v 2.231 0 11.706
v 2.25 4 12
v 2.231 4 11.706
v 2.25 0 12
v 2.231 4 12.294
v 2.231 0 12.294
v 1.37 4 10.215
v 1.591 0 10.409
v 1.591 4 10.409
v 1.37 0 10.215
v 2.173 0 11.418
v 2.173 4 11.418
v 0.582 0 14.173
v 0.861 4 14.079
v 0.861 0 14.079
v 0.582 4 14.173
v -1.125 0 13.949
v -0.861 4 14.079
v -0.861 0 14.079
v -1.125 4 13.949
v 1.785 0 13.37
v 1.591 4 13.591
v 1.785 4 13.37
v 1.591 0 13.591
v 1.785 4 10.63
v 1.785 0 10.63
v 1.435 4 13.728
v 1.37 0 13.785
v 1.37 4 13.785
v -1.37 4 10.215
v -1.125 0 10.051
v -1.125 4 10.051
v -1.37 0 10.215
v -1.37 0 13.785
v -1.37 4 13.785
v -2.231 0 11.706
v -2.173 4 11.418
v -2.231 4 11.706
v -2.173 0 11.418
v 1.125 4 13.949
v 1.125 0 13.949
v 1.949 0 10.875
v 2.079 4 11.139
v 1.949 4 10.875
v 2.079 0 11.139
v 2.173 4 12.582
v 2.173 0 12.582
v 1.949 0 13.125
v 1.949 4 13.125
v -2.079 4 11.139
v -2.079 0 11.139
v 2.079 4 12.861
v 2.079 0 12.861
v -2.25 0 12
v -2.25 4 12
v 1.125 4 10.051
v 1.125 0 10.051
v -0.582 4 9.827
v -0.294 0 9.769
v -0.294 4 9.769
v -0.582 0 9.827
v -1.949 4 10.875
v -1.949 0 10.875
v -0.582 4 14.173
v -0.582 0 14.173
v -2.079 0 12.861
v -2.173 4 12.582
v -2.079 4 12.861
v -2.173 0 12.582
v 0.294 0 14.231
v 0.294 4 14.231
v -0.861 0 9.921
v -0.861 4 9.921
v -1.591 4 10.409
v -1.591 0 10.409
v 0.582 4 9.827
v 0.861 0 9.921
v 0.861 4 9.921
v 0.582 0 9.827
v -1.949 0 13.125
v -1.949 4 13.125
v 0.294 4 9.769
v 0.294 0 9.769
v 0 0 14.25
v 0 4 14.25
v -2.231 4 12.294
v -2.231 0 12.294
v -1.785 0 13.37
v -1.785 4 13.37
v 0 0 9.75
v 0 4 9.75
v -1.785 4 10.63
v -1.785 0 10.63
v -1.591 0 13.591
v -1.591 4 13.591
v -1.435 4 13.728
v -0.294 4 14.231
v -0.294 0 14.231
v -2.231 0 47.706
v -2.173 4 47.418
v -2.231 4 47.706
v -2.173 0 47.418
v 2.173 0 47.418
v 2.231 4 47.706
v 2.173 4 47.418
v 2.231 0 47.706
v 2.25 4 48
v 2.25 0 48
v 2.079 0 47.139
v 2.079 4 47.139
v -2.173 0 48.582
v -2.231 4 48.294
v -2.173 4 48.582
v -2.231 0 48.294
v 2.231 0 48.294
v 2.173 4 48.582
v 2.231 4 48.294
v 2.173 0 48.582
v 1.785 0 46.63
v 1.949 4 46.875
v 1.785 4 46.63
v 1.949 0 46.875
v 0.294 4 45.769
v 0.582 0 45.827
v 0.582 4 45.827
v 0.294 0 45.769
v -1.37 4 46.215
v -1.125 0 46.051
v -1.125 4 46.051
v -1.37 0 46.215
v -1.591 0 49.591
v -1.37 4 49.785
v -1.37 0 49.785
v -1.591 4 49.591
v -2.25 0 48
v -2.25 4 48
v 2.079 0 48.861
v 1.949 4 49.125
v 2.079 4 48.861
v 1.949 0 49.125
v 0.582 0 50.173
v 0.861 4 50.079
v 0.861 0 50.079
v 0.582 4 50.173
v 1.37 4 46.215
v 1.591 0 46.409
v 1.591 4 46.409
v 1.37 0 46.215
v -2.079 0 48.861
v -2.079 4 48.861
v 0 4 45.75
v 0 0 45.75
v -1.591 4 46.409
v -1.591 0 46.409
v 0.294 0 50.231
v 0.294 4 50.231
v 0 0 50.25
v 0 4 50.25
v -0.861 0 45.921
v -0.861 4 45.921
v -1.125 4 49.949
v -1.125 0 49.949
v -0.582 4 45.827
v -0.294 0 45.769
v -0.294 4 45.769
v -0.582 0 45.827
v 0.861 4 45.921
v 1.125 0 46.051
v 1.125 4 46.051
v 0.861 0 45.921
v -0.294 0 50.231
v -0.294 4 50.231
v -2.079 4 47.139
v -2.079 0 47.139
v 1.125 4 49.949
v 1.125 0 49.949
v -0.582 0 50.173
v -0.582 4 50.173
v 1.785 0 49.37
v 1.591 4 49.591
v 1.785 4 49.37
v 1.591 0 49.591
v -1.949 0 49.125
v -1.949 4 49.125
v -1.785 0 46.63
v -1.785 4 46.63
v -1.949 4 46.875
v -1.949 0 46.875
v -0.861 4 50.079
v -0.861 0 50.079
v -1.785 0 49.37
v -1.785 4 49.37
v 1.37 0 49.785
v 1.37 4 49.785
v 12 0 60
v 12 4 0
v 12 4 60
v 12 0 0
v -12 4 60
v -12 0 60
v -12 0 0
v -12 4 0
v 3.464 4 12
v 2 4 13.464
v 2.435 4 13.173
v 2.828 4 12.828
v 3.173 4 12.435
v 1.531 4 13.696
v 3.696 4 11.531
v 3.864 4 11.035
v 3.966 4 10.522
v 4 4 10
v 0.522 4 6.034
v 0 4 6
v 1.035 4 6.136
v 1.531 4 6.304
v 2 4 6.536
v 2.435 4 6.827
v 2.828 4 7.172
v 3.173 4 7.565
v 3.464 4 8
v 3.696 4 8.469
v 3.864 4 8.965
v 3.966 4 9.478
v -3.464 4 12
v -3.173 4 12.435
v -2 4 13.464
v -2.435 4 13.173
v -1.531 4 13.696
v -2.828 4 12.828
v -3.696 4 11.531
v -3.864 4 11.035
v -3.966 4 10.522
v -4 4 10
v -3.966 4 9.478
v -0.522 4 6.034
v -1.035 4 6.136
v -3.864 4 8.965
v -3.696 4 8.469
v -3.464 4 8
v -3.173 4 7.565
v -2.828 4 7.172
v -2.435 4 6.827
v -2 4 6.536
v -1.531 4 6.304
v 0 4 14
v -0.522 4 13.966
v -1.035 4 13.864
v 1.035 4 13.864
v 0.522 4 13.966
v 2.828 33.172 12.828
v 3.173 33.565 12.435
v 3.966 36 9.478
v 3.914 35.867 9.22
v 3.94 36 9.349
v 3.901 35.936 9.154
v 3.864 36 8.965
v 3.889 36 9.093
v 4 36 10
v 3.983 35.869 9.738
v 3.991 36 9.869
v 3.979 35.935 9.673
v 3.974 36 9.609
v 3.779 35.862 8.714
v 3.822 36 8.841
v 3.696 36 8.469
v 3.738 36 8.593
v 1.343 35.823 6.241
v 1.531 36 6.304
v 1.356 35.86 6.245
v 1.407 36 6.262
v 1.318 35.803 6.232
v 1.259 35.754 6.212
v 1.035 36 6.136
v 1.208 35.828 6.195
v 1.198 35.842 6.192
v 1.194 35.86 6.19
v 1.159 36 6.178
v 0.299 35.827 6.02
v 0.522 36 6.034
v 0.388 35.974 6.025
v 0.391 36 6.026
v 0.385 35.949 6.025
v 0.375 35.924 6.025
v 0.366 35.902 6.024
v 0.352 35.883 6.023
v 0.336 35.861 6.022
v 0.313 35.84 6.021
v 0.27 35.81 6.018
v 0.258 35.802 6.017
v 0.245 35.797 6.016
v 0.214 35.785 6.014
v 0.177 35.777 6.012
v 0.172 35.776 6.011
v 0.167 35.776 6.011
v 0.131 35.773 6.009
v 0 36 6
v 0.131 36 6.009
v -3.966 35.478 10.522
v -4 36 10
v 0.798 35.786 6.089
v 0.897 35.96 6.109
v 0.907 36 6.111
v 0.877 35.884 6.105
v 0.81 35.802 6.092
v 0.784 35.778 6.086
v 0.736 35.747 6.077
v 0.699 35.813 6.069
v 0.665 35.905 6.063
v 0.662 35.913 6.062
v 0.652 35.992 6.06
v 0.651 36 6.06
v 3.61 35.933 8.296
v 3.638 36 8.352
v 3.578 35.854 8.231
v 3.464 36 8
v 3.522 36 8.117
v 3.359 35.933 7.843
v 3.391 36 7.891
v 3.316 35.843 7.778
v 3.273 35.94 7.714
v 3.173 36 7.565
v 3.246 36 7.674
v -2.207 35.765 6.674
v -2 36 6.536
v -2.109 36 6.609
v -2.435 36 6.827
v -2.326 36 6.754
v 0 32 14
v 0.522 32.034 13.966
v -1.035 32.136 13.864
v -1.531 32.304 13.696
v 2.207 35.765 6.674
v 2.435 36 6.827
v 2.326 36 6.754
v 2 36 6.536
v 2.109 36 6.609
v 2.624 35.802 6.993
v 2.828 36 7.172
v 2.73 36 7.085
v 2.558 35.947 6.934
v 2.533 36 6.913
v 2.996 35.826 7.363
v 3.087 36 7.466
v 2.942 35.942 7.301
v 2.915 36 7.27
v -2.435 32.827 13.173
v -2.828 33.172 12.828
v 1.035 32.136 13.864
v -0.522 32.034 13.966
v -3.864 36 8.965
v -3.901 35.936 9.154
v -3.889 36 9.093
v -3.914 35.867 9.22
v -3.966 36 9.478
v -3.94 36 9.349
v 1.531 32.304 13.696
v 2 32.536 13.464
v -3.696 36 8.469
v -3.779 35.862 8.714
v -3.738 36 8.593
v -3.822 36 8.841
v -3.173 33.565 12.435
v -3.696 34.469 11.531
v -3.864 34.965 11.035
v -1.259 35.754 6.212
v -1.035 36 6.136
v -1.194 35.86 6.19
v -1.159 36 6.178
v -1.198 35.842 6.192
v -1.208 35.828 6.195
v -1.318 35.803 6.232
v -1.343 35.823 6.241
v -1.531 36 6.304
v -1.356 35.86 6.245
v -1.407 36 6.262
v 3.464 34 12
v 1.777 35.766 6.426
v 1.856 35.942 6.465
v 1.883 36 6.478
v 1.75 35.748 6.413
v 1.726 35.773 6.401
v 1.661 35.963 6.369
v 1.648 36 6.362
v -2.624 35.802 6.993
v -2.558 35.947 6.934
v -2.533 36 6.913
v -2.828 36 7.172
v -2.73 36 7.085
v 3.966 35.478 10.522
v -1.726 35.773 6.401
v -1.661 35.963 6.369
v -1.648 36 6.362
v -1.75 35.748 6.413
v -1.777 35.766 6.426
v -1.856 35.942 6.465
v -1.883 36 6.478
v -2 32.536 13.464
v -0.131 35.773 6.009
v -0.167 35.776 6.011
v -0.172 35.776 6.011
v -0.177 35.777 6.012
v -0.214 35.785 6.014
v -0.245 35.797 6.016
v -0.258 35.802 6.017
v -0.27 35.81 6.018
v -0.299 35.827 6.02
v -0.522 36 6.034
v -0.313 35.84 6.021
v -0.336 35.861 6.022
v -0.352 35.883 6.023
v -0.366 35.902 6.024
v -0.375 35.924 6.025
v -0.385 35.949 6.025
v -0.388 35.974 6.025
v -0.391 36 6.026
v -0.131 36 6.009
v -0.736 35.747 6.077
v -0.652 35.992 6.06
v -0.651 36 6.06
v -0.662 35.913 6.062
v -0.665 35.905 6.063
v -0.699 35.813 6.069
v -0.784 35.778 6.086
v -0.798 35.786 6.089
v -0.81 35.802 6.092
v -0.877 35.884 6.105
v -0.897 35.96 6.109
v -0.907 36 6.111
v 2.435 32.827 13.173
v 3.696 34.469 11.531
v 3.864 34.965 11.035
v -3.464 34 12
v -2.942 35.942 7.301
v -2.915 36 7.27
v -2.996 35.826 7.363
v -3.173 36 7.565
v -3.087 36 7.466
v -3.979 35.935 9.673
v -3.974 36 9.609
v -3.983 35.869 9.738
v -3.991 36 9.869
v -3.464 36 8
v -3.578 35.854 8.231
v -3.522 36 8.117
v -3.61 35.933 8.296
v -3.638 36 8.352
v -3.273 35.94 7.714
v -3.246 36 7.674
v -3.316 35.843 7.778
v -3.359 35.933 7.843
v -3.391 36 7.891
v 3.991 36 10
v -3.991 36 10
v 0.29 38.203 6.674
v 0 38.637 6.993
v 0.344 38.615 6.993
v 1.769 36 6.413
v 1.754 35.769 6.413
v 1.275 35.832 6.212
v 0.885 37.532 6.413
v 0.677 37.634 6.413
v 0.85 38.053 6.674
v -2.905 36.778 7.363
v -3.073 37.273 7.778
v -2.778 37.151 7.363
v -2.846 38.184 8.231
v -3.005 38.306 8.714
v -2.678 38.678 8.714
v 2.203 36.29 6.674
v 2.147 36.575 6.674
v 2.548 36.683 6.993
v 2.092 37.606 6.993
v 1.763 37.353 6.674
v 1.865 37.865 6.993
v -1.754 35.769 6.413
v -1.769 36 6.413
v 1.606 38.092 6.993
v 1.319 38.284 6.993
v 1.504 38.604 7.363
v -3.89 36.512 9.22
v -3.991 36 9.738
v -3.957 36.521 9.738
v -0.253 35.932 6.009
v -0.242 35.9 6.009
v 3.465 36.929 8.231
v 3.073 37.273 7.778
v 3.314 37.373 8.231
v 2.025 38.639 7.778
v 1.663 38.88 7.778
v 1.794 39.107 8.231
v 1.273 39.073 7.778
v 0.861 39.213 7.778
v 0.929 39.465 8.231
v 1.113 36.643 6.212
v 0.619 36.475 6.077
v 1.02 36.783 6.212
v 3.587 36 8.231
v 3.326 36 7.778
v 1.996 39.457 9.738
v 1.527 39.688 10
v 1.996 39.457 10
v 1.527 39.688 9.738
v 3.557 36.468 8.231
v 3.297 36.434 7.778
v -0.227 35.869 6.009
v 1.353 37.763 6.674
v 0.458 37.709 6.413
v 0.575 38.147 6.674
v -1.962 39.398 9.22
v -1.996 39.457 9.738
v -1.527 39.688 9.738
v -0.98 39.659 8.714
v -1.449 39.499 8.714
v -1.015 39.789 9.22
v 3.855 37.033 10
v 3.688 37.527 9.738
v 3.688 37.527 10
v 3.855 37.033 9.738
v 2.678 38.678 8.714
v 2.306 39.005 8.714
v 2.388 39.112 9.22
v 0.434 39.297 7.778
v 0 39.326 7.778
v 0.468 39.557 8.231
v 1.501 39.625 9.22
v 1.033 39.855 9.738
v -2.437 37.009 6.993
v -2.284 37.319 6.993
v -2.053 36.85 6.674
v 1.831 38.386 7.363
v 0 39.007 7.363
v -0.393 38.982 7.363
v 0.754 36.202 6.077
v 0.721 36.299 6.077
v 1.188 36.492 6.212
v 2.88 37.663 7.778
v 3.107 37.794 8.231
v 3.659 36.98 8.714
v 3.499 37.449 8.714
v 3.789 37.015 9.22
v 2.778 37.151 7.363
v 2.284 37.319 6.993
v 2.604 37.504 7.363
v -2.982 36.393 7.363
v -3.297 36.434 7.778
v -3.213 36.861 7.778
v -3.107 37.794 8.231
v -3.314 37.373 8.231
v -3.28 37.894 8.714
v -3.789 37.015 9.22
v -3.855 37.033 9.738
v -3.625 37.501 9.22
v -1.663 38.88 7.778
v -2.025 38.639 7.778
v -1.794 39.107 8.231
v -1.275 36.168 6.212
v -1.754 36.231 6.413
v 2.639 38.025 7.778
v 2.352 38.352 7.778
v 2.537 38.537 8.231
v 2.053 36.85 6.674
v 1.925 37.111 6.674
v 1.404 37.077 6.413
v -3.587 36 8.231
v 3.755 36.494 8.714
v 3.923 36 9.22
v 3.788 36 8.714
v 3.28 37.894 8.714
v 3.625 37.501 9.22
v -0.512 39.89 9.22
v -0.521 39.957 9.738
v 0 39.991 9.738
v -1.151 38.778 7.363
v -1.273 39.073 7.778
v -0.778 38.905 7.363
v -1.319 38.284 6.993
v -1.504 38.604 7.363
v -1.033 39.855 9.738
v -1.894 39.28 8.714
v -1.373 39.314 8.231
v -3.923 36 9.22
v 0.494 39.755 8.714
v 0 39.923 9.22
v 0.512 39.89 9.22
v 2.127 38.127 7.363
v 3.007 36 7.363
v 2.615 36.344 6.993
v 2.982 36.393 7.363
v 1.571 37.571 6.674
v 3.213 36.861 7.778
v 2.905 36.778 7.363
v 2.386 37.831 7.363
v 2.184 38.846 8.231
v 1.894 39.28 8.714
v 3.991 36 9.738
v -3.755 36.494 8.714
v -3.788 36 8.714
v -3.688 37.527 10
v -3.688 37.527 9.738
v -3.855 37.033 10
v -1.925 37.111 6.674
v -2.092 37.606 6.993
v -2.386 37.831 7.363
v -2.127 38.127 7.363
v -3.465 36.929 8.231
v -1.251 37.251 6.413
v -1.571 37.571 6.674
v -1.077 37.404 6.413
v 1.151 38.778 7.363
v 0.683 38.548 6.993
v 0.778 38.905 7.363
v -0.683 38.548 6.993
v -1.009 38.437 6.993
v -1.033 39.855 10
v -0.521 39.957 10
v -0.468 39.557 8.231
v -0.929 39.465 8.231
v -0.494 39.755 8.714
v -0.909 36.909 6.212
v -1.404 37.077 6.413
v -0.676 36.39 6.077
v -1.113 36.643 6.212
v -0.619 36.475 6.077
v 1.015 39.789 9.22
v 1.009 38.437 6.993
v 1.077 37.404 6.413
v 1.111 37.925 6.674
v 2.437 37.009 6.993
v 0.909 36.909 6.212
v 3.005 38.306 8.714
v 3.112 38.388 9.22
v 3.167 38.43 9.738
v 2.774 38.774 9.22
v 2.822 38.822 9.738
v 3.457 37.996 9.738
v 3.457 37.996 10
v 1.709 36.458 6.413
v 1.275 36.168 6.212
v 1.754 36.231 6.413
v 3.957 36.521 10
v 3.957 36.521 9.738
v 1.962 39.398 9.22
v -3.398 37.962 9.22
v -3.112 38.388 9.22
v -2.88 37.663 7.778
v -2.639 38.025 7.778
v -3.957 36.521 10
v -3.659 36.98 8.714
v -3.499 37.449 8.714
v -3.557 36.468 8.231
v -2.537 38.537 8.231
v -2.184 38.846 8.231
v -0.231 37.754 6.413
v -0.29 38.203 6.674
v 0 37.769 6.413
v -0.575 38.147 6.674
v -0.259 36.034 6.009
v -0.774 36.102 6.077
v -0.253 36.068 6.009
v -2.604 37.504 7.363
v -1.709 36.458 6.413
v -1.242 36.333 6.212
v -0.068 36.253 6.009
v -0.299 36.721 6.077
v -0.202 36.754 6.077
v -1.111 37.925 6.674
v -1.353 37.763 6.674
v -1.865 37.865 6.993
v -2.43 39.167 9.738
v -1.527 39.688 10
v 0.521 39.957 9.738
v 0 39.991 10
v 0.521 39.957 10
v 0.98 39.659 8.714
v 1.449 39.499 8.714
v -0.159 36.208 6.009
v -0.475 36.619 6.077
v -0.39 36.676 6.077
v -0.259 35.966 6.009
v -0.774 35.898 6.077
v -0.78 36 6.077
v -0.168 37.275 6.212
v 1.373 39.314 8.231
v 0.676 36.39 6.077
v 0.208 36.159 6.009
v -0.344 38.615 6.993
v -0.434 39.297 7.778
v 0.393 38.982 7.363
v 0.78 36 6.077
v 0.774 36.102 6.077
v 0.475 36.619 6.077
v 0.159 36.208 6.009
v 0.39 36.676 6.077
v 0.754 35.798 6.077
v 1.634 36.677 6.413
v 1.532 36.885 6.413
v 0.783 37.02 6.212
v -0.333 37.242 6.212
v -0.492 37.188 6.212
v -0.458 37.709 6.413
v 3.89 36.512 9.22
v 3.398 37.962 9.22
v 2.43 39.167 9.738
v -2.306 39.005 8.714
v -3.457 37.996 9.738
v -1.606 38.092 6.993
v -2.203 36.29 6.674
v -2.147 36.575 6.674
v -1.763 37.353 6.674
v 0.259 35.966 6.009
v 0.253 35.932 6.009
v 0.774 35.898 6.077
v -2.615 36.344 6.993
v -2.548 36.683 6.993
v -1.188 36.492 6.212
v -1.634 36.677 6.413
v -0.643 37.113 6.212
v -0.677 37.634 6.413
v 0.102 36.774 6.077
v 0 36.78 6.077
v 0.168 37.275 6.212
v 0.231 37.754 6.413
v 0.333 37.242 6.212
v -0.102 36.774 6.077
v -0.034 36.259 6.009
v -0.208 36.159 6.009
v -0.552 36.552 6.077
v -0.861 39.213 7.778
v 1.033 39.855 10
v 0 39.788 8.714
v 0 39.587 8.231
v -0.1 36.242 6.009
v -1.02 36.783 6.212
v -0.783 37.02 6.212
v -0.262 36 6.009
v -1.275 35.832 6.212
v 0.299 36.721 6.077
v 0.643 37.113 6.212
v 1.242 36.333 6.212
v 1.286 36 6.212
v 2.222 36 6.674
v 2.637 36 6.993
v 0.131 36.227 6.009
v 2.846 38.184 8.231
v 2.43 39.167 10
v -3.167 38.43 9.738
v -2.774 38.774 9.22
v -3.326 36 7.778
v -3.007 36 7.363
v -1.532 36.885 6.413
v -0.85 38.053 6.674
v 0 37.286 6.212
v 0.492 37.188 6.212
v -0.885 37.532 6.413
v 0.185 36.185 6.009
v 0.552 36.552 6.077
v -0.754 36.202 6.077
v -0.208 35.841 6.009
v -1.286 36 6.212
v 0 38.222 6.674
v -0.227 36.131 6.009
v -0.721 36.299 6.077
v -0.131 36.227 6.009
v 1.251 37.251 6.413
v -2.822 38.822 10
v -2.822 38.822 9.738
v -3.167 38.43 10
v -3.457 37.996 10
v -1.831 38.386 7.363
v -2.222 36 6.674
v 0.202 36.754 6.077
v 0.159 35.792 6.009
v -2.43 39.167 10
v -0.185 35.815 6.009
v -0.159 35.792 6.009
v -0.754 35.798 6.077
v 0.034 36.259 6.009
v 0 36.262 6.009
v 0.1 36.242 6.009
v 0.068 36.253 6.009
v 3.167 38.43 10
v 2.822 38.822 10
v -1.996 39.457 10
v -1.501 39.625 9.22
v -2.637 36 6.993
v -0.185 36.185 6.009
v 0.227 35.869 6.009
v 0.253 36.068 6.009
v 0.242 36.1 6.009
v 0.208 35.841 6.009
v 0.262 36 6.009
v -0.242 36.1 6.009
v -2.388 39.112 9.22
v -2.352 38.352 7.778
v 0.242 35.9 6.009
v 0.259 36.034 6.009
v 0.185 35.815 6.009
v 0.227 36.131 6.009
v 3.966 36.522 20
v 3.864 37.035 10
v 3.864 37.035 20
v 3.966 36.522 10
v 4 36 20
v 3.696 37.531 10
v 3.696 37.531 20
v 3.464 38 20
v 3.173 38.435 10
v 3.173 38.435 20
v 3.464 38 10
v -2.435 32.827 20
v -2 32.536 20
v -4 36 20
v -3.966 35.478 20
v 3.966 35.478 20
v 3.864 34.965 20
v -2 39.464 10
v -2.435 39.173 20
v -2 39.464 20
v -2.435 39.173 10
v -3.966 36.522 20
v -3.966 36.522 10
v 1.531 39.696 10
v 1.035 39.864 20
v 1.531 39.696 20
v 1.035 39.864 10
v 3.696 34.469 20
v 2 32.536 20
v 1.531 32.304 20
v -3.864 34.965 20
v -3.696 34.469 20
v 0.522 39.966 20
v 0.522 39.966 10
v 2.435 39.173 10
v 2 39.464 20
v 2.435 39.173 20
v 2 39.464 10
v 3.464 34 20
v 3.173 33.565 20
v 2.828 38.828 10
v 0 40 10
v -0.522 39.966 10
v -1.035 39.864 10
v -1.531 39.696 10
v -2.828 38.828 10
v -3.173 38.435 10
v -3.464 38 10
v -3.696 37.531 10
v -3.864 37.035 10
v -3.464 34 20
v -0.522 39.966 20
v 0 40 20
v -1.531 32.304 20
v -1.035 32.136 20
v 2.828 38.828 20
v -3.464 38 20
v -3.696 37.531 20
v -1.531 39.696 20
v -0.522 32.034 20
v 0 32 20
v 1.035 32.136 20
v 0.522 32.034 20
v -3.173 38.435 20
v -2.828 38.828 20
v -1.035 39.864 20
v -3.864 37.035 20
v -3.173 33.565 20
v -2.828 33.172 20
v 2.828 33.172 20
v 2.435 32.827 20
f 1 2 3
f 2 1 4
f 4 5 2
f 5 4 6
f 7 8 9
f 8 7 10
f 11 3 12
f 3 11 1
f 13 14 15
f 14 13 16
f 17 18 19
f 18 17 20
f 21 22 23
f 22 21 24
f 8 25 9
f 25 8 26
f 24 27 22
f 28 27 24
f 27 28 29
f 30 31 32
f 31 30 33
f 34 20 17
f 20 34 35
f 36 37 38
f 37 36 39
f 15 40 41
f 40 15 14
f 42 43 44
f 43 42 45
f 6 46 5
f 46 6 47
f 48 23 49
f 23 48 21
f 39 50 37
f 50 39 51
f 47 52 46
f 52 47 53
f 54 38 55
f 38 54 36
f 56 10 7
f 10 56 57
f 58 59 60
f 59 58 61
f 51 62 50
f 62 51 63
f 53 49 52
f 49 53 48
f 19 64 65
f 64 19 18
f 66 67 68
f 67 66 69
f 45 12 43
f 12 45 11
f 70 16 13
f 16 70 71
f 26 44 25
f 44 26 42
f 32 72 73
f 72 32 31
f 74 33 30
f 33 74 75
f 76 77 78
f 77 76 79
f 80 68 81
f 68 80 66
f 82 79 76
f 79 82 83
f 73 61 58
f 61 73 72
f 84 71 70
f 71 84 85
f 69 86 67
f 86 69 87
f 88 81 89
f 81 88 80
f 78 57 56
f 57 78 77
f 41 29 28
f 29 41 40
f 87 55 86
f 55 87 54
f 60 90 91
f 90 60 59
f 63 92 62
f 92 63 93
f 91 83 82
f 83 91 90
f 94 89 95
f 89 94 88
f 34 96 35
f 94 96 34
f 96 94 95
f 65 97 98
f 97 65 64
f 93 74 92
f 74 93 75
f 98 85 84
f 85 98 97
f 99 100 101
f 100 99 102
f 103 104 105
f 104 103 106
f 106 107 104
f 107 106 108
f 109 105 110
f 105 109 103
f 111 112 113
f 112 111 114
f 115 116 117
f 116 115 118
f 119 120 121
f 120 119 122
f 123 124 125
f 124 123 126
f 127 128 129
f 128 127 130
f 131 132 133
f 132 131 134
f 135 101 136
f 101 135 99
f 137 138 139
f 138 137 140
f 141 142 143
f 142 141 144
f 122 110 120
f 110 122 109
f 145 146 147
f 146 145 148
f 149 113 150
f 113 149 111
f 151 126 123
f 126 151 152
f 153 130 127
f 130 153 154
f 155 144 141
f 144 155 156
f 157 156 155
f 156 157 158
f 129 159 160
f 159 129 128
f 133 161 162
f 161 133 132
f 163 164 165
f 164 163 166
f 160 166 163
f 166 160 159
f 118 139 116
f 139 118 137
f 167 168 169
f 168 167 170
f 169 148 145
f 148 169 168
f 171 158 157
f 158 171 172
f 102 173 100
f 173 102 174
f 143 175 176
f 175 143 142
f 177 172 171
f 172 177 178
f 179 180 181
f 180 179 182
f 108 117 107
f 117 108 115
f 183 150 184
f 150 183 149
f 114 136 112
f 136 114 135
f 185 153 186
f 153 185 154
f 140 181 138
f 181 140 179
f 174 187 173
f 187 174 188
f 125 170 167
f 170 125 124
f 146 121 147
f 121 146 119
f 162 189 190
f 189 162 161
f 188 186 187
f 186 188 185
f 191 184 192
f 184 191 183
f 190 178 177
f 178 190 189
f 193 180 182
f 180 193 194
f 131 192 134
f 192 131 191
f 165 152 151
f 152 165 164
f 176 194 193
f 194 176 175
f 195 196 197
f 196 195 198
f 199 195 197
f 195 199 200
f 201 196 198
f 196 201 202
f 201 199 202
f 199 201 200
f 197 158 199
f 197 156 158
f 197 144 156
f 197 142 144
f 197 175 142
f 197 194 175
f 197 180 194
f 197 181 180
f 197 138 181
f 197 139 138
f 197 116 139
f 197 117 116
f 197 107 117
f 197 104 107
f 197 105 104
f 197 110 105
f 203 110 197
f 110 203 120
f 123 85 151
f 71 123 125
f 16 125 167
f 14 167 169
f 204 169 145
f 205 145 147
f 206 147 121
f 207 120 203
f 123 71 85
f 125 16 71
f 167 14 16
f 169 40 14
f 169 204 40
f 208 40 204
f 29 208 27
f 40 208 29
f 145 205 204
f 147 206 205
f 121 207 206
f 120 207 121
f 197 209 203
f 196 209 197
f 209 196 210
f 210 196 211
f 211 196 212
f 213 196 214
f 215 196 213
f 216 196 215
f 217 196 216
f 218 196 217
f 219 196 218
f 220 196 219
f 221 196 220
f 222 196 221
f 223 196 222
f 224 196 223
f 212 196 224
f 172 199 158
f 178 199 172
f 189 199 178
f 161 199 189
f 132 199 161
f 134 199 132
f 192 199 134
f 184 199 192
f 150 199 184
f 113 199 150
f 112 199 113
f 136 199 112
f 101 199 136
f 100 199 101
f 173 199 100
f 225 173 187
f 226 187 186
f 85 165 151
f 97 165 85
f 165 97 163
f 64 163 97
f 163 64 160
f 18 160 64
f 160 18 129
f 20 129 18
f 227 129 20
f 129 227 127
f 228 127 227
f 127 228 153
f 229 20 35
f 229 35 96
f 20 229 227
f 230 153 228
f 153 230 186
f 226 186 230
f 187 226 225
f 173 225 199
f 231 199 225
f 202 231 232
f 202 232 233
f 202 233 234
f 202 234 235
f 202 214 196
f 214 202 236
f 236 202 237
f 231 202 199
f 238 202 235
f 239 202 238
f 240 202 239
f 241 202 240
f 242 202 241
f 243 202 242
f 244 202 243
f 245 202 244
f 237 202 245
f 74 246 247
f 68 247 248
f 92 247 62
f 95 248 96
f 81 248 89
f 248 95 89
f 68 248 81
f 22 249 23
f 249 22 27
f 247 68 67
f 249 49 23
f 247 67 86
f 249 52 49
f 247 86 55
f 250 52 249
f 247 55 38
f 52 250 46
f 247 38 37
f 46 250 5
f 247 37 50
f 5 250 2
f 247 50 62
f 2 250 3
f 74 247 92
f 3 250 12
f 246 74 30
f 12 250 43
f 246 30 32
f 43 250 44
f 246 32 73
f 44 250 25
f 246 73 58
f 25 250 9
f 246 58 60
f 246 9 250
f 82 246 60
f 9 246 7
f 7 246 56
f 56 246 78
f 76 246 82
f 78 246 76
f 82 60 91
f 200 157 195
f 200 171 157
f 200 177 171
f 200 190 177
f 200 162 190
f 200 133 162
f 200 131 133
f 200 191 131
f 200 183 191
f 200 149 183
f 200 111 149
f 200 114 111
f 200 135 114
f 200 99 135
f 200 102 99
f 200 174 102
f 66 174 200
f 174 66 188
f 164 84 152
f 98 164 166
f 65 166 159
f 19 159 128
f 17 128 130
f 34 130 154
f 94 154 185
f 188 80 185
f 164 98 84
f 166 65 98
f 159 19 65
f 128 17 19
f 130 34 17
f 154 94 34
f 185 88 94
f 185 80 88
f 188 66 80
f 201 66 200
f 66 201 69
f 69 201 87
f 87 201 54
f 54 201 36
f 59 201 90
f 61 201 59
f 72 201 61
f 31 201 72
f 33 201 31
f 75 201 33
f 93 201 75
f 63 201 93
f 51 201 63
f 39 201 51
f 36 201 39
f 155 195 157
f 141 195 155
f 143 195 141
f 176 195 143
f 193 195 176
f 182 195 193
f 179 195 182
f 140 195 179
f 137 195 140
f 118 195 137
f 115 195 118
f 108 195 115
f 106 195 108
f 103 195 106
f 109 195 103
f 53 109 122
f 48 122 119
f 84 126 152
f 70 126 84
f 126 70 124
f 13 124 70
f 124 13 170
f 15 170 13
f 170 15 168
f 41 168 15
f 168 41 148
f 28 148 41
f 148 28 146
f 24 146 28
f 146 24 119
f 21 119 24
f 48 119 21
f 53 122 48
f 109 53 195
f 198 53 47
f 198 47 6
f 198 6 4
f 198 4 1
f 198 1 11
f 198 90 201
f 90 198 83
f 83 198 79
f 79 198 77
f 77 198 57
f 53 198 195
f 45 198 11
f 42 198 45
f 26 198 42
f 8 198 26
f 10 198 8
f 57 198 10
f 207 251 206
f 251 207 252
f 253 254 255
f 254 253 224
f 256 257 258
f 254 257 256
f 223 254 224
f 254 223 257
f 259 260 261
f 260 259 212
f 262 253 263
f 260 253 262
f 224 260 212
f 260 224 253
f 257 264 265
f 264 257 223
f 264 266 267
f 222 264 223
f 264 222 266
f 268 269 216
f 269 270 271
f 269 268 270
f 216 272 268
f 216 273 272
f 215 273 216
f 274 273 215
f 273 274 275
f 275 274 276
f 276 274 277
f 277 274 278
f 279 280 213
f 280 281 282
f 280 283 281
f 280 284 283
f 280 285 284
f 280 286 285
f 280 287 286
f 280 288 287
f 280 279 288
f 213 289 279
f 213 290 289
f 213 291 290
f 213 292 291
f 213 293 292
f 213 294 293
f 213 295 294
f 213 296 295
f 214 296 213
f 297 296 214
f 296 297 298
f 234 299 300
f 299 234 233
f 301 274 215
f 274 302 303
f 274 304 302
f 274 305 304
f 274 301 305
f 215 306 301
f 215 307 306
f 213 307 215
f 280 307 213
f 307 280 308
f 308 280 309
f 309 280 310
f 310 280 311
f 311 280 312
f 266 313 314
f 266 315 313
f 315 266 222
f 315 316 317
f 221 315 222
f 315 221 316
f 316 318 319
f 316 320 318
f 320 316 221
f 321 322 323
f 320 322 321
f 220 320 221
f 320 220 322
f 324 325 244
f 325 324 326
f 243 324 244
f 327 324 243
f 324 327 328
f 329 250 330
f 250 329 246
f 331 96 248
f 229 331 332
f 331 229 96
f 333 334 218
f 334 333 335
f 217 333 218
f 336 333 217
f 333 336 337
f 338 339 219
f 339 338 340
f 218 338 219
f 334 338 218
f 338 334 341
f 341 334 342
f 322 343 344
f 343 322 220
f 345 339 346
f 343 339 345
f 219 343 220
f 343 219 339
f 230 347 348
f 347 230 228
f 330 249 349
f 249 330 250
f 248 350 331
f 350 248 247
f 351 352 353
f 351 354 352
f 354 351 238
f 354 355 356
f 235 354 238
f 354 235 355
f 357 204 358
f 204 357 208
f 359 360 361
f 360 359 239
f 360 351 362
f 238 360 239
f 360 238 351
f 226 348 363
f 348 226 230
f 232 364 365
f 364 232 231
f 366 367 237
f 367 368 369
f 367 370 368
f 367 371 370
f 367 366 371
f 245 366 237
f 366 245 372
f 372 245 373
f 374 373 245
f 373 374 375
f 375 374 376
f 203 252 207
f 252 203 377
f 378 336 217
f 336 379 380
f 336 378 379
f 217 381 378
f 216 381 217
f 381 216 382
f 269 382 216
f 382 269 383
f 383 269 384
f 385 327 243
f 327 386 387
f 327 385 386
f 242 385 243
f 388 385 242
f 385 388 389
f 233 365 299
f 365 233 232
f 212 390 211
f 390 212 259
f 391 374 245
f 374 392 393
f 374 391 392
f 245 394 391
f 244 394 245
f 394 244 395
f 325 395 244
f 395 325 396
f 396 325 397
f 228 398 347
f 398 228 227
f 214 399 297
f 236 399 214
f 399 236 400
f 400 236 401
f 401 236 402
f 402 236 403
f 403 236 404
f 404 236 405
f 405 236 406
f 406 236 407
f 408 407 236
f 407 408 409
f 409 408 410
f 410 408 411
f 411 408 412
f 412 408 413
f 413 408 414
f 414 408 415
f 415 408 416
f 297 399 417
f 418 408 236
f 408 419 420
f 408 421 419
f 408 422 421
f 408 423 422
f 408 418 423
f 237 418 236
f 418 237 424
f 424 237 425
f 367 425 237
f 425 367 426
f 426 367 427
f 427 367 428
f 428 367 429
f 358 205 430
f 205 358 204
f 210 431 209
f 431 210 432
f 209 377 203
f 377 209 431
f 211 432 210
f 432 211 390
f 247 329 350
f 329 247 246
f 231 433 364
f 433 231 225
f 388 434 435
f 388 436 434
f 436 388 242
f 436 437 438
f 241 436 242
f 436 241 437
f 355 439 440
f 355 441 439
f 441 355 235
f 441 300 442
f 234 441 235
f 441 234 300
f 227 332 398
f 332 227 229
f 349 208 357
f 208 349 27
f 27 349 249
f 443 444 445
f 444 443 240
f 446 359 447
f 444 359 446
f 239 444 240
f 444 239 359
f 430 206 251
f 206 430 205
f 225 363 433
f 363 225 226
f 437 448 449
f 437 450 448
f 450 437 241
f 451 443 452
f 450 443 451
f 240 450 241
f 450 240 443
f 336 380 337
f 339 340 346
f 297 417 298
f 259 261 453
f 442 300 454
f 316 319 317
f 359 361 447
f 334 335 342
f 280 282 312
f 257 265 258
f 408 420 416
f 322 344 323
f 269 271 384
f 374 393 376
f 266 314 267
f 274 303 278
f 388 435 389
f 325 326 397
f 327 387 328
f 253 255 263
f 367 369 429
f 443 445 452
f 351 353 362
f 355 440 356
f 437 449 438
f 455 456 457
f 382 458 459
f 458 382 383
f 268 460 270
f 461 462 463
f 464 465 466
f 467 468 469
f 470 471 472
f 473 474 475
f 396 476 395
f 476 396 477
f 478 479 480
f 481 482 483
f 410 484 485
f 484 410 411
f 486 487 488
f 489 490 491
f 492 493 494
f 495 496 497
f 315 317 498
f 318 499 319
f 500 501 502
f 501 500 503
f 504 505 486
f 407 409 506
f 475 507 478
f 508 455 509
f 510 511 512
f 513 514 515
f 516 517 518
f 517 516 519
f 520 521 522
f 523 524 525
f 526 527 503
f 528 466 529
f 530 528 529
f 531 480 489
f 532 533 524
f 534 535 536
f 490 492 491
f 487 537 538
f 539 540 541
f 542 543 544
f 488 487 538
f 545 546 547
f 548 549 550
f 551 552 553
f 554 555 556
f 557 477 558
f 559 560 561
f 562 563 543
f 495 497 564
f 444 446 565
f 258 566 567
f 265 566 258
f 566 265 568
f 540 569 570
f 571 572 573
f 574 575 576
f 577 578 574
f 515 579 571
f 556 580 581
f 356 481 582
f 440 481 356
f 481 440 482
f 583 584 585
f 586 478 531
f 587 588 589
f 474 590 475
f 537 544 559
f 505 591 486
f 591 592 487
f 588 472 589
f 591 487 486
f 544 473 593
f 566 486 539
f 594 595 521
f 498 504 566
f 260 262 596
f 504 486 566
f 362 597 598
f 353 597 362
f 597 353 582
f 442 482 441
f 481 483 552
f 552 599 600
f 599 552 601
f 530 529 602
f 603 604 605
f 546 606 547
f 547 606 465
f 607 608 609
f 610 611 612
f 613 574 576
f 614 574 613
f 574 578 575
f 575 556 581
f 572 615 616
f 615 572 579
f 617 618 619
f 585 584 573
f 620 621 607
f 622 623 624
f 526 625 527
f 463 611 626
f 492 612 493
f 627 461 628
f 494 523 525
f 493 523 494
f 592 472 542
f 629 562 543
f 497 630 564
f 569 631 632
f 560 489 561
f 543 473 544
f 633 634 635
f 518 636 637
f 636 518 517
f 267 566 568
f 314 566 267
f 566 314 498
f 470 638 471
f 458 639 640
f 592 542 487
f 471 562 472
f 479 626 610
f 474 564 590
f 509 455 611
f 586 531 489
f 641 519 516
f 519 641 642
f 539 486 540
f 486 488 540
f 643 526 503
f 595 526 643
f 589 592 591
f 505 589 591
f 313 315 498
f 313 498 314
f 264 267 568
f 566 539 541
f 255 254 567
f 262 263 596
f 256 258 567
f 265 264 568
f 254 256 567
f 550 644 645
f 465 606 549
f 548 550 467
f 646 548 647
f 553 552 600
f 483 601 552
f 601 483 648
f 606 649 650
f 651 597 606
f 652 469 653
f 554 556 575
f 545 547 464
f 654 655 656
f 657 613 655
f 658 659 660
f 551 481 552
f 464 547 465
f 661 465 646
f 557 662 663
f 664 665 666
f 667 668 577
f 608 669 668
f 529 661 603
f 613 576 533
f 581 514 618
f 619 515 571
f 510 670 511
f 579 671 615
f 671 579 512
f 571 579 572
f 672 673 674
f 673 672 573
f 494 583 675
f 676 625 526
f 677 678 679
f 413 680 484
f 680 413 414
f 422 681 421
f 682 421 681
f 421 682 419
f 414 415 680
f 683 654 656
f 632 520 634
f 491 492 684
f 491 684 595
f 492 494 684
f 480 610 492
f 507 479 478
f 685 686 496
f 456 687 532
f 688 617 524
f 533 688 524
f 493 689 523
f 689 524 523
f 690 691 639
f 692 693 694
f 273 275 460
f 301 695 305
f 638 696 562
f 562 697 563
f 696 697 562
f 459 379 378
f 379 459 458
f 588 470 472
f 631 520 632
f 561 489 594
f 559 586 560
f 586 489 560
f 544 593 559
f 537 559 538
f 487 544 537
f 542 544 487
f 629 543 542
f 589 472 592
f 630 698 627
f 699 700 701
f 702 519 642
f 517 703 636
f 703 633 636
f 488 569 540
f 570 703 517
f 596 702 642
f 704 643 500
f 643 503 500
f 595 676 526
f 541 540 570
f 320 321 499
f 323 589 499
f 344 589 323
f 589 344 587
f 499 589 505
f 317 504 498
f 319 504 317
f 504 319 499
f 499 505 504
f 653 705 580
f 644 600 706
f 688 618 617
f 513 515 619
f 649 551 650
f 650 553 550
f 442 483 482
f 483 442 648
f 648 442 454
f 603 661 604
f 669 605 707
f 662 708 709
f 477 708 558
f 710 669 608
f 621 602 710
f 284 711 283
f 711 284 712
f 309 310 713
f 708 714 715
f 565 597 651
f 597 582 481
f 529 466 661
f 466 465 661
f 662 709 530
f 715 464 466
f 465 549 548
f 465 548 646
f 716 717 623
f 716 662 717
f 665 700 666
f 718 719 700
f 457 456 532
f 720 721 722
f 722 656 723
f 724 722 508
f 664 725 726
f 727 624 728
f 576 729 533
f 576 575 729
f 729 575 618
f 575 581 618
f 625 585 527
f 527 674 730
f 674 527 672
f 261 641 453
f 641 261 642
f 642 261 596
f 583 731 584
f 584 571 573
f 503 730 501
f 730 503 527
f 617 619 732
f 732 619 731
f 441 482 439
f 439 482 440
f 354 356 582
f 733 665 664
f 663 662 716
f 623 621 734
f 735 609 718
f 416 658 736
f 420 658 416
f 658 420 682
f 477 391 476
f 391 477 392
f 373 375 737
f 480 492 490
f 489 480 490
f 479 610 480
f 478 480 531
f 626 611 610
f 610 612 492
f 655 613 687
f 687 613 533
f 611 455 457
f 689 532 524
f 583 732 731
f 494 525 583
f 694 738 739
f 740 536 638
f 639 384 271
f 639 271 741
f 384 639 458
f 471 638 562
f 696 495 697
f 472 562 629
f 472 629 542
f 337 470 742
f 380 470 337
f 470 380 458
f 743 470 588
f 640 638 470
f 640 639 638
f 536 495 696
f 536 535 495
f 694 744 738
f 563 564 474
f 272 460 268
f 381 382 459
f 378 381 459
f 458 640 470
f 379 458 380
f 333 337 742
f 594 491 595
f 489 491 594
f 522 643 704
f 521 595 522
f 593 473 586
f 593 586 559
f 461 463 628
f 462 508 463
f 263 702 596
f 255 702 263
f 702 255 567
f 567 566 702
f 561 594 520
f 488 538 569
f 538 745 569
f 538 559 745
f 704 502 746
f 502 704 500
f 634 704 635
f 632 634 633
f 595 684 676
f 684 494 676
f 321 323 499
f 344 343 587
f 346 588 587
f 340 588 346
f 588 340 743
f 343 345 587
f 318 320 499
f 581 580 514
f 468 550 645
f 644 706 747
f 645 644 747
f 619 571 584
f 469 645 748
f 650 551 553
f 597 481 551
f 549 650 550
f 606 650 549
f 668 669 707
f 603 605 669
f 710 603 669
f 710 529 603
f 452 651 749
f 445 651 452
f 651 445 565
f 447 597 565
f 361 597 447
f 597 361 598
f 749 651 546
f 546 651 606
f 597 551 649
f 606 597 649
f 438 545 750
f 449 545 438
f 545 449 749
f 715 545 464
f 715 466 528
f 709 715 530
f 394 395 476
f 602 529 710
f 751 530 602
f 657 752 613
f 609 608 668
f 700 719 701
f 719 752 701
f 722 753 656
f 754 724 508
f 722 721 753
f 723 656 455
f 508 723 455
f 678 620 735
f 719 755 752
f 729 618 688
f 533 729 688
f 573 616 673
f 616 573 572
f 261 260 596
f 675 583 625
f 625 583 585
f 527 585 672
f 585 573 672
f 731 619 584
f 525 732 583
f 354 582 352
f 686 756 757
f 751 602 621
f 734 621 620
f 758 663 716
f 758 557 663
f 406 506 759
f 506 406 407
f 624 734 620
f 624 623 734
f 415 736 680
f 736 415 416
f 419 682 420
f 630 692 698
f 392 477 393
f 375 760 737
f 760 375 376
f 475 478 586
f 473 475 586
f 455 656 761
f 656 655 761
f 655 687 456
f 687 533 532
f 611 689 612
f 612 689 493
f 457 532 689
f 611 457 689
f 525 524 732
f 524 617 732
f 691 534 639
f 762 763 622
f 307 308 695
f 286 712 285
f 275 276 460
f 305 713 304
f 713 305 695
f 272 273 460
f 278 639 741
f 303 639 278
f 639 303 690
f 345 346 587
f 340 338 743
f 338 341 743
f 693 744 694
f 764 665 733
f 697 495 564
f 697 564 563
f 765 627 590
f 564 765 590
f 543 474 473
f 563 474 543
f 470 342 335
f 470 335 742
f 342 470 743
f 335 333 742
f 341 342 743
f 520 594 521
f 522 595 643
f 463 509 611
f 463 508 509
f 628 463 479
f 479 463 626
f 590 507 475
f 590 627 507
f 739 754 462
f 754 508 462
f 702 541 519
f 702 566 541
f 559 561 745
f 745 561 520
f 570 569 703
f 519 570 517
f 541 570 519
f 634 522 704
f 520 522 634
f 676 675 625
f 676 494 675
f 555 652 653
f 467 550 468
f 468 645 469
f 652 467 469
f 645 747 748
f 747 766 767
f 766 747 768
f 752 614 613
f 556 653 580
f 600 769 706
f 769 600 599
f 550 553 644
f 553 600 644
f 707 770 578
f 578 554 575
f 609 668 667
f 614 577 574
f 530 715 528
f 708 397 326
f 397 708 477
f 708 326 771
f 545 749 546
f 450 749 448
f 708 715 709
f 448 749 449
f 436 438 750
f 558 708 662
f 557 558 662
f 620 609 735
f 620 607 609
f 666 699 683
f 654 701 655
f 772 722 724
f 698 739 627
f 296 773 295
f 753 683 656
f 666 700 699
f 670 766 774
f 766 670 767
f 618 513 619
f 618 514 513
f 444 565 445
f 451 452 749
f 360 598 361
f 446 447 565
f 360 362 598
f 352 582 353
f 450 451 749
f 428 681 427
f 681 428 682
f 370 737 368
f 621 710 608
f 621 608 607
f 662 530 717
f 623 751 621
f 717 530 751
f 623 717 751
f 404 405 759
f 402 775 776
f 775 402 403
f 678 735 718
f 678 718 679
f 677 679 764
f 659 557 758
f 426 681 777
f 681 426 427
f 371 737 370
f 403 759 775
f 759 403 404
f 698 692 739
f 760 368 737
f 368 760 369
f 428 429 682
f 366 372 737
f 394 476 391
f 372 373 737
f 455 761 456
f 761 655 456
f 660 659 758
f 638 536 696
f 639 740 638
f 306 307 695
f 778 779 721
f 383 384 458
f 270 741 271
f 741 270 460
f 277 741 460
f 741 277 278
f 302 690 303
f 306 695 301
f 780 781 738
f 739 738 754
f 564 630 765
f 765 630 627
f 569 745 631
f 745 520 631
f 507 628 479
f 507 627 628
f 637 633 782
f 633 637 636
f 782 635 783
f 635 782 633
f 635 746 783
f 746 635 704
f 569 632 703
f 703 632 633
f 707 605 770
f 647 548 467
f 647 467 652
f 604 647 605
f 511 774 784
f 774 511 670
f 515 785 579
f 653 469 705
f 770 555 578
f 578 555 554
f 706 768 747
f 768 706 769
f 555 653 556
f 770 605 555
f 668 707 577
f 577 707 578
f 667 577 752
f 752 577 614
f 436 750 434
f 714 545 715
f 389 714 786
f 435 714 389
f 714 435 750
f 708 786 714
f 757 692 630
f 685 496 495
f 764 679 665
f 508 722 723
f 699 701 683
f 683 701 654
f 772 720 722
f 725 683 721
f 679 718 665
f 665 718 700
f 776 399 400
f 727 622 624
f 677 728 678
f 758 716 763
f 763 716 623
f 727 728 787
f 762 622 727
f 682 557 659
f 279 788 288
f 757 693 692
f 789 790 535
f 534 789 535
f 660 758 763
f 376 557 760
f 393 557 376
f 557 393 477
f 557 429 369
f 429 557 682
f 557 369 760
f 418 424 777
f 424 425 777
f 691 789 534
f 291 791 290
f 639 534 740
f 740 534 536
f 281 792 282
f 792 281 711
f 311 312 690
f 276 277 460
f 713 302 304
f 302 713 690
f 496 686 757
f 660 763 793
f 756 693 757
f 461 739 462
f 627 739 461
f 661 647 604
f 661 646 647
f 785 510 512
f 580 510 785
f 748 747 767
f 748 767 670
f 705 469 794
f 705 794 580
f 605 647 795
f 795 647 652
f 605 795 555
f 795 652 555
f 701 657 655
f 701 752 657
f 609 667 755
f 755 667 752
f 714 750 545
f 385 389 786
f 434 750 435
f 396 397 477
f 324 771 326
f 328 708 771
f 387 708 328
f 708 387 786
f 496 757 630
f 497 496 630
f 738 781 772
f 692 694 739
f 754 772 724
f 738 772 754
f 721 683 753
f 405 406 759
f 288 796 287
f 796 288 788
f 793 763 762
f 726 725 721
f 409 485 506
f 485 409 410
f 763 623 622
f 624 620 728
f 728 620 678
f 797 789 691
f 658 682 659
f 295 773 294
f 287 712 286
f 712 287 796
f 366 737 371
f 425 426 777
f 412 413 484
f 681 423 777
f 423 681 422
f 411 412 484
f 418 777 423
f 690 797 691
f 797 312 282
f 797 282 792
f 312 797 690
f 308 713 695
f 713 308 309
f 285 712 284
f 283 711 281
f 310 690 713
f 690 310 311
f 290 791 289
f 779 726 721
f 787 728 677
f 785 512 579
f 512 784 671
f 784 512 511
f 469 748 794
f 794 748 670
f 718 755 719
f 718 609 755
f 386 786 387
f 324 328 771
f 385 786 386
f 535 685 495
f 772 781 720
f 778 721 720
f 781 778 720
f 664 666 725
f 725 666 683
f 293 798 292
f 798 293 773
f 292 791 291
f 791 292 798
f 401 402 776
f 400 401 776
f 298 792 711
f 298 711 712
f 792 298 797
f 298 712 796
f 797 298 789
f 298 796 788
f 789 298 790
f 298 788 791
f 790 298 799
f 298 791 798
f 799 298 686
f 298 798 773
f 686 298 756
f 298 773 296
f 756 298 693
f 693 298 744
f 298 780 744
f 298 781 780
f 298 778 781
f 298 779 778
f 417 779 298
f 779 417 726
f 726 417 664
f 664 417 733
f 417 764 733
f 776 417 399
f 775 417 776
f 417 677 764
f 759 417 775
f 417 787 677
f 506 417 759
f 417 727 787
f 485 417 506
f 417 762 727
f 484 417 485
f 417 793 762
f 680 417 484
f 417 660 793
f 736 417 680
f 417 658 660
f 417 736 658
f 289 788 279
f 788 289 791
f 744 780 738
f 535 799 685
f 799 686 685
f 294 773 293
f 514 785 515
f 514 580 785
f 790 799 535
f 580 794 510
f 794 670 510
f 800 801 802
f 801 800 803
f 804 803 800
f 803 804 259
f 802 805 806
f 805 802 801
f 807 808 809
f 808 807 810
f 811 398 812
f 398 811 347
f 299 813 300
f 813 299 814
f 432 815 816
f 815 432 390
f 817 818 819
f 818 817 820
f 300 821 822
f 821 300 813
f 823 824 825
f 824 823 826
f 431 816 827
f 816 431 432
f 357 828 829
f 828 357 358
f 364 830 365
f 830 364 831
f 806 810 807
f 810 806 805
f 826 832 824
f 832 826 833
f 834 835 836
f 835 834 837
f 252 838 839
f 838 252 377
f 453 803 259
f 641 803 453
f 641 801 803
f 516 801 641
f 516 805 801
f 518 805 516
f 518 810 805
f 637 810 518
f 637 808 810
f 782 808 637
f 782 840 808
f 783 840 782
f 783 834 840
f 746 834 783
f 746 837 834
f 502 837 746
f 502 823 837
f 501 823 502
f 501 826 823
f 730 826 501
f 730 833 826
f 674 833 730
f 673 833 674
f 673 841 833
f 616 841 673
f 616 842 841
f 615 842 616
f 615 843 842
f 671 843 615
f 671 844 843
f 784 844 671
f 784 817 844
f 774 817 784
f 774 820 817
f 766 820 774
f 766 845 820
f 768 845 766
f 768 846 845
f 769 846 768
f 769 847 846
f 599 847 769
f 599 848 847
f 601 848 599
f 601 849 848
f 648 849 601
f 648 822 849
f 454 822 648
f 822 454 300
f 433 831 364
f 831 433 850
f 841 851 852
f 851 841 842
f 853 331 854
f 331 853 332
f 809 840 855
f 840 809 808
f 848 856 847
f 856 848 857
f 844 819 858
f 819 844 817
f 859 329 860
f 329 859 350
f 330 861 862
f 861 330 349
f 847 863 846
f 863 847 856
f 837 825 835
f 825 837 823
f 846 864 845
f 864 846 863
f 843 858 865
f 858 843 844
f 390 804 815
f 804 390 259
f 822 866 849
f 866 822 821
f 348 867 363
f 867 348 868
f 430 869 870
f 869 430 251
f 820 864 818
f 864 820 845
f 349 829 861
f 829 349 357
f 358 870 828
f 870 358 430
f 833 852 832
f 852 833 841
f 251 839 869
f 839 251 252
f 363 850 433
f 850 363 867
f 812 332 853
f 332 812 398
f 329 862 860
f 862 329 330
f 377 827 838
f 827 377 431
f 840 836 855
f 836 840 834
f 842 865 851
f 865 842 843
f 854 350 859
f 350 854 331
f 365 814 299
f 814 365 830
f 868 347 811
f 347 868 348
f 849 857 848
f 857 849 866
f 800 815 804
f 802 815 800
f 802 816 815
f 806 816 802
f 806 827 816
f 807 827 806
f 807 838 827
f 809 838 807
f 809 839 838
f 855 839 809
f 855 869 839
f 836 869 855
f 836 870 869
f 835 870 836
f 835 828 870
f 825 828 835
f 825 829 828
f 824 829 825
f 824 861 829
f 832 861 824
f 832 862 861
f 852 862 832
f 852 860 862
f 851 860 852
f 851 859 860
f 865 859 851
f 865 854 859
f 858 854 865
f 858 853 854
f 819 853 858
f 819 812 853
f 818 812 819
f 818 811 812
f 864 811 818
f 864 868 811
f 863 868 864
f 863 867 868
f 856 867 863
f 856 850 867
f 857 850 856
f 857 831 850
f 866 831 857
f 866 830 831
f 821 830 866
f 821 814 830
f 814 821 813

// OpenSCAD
// Wall hook: back plate with two screw holes and an arm with a raised tip.
width = 24;          // [16:2:40]
height = 60;
thickness = 4;
reach = 32;          // [20:2:50]
arm = 8;             // [6:1:12]

$fn = 48;

module plate() {
    difference() {
        translate([-width / 2, 0, 0]) cube([width, thickness, height]);
        for (z = [12, height - 12])
            translate([0, -1, z]) rotate([-90, 0, 0]) cylinder(d = 4.5, h = thickness + 2);
    }
}

module hook_arm() {
    translate([0, thickness, arm / 2 + 6]) rotate([-90, 0, 0]) cylinder(d = arm, h = reach);
    // Raised tip so nothing slides off
    translate([0, thickness + reach, arm / 2 + 6]) sphere(d = arm);
    translate([0, thickness + reach, arm / 2 + 6]) cylinder(d = arm, h = 10);
}

plate();
hook_arm();
